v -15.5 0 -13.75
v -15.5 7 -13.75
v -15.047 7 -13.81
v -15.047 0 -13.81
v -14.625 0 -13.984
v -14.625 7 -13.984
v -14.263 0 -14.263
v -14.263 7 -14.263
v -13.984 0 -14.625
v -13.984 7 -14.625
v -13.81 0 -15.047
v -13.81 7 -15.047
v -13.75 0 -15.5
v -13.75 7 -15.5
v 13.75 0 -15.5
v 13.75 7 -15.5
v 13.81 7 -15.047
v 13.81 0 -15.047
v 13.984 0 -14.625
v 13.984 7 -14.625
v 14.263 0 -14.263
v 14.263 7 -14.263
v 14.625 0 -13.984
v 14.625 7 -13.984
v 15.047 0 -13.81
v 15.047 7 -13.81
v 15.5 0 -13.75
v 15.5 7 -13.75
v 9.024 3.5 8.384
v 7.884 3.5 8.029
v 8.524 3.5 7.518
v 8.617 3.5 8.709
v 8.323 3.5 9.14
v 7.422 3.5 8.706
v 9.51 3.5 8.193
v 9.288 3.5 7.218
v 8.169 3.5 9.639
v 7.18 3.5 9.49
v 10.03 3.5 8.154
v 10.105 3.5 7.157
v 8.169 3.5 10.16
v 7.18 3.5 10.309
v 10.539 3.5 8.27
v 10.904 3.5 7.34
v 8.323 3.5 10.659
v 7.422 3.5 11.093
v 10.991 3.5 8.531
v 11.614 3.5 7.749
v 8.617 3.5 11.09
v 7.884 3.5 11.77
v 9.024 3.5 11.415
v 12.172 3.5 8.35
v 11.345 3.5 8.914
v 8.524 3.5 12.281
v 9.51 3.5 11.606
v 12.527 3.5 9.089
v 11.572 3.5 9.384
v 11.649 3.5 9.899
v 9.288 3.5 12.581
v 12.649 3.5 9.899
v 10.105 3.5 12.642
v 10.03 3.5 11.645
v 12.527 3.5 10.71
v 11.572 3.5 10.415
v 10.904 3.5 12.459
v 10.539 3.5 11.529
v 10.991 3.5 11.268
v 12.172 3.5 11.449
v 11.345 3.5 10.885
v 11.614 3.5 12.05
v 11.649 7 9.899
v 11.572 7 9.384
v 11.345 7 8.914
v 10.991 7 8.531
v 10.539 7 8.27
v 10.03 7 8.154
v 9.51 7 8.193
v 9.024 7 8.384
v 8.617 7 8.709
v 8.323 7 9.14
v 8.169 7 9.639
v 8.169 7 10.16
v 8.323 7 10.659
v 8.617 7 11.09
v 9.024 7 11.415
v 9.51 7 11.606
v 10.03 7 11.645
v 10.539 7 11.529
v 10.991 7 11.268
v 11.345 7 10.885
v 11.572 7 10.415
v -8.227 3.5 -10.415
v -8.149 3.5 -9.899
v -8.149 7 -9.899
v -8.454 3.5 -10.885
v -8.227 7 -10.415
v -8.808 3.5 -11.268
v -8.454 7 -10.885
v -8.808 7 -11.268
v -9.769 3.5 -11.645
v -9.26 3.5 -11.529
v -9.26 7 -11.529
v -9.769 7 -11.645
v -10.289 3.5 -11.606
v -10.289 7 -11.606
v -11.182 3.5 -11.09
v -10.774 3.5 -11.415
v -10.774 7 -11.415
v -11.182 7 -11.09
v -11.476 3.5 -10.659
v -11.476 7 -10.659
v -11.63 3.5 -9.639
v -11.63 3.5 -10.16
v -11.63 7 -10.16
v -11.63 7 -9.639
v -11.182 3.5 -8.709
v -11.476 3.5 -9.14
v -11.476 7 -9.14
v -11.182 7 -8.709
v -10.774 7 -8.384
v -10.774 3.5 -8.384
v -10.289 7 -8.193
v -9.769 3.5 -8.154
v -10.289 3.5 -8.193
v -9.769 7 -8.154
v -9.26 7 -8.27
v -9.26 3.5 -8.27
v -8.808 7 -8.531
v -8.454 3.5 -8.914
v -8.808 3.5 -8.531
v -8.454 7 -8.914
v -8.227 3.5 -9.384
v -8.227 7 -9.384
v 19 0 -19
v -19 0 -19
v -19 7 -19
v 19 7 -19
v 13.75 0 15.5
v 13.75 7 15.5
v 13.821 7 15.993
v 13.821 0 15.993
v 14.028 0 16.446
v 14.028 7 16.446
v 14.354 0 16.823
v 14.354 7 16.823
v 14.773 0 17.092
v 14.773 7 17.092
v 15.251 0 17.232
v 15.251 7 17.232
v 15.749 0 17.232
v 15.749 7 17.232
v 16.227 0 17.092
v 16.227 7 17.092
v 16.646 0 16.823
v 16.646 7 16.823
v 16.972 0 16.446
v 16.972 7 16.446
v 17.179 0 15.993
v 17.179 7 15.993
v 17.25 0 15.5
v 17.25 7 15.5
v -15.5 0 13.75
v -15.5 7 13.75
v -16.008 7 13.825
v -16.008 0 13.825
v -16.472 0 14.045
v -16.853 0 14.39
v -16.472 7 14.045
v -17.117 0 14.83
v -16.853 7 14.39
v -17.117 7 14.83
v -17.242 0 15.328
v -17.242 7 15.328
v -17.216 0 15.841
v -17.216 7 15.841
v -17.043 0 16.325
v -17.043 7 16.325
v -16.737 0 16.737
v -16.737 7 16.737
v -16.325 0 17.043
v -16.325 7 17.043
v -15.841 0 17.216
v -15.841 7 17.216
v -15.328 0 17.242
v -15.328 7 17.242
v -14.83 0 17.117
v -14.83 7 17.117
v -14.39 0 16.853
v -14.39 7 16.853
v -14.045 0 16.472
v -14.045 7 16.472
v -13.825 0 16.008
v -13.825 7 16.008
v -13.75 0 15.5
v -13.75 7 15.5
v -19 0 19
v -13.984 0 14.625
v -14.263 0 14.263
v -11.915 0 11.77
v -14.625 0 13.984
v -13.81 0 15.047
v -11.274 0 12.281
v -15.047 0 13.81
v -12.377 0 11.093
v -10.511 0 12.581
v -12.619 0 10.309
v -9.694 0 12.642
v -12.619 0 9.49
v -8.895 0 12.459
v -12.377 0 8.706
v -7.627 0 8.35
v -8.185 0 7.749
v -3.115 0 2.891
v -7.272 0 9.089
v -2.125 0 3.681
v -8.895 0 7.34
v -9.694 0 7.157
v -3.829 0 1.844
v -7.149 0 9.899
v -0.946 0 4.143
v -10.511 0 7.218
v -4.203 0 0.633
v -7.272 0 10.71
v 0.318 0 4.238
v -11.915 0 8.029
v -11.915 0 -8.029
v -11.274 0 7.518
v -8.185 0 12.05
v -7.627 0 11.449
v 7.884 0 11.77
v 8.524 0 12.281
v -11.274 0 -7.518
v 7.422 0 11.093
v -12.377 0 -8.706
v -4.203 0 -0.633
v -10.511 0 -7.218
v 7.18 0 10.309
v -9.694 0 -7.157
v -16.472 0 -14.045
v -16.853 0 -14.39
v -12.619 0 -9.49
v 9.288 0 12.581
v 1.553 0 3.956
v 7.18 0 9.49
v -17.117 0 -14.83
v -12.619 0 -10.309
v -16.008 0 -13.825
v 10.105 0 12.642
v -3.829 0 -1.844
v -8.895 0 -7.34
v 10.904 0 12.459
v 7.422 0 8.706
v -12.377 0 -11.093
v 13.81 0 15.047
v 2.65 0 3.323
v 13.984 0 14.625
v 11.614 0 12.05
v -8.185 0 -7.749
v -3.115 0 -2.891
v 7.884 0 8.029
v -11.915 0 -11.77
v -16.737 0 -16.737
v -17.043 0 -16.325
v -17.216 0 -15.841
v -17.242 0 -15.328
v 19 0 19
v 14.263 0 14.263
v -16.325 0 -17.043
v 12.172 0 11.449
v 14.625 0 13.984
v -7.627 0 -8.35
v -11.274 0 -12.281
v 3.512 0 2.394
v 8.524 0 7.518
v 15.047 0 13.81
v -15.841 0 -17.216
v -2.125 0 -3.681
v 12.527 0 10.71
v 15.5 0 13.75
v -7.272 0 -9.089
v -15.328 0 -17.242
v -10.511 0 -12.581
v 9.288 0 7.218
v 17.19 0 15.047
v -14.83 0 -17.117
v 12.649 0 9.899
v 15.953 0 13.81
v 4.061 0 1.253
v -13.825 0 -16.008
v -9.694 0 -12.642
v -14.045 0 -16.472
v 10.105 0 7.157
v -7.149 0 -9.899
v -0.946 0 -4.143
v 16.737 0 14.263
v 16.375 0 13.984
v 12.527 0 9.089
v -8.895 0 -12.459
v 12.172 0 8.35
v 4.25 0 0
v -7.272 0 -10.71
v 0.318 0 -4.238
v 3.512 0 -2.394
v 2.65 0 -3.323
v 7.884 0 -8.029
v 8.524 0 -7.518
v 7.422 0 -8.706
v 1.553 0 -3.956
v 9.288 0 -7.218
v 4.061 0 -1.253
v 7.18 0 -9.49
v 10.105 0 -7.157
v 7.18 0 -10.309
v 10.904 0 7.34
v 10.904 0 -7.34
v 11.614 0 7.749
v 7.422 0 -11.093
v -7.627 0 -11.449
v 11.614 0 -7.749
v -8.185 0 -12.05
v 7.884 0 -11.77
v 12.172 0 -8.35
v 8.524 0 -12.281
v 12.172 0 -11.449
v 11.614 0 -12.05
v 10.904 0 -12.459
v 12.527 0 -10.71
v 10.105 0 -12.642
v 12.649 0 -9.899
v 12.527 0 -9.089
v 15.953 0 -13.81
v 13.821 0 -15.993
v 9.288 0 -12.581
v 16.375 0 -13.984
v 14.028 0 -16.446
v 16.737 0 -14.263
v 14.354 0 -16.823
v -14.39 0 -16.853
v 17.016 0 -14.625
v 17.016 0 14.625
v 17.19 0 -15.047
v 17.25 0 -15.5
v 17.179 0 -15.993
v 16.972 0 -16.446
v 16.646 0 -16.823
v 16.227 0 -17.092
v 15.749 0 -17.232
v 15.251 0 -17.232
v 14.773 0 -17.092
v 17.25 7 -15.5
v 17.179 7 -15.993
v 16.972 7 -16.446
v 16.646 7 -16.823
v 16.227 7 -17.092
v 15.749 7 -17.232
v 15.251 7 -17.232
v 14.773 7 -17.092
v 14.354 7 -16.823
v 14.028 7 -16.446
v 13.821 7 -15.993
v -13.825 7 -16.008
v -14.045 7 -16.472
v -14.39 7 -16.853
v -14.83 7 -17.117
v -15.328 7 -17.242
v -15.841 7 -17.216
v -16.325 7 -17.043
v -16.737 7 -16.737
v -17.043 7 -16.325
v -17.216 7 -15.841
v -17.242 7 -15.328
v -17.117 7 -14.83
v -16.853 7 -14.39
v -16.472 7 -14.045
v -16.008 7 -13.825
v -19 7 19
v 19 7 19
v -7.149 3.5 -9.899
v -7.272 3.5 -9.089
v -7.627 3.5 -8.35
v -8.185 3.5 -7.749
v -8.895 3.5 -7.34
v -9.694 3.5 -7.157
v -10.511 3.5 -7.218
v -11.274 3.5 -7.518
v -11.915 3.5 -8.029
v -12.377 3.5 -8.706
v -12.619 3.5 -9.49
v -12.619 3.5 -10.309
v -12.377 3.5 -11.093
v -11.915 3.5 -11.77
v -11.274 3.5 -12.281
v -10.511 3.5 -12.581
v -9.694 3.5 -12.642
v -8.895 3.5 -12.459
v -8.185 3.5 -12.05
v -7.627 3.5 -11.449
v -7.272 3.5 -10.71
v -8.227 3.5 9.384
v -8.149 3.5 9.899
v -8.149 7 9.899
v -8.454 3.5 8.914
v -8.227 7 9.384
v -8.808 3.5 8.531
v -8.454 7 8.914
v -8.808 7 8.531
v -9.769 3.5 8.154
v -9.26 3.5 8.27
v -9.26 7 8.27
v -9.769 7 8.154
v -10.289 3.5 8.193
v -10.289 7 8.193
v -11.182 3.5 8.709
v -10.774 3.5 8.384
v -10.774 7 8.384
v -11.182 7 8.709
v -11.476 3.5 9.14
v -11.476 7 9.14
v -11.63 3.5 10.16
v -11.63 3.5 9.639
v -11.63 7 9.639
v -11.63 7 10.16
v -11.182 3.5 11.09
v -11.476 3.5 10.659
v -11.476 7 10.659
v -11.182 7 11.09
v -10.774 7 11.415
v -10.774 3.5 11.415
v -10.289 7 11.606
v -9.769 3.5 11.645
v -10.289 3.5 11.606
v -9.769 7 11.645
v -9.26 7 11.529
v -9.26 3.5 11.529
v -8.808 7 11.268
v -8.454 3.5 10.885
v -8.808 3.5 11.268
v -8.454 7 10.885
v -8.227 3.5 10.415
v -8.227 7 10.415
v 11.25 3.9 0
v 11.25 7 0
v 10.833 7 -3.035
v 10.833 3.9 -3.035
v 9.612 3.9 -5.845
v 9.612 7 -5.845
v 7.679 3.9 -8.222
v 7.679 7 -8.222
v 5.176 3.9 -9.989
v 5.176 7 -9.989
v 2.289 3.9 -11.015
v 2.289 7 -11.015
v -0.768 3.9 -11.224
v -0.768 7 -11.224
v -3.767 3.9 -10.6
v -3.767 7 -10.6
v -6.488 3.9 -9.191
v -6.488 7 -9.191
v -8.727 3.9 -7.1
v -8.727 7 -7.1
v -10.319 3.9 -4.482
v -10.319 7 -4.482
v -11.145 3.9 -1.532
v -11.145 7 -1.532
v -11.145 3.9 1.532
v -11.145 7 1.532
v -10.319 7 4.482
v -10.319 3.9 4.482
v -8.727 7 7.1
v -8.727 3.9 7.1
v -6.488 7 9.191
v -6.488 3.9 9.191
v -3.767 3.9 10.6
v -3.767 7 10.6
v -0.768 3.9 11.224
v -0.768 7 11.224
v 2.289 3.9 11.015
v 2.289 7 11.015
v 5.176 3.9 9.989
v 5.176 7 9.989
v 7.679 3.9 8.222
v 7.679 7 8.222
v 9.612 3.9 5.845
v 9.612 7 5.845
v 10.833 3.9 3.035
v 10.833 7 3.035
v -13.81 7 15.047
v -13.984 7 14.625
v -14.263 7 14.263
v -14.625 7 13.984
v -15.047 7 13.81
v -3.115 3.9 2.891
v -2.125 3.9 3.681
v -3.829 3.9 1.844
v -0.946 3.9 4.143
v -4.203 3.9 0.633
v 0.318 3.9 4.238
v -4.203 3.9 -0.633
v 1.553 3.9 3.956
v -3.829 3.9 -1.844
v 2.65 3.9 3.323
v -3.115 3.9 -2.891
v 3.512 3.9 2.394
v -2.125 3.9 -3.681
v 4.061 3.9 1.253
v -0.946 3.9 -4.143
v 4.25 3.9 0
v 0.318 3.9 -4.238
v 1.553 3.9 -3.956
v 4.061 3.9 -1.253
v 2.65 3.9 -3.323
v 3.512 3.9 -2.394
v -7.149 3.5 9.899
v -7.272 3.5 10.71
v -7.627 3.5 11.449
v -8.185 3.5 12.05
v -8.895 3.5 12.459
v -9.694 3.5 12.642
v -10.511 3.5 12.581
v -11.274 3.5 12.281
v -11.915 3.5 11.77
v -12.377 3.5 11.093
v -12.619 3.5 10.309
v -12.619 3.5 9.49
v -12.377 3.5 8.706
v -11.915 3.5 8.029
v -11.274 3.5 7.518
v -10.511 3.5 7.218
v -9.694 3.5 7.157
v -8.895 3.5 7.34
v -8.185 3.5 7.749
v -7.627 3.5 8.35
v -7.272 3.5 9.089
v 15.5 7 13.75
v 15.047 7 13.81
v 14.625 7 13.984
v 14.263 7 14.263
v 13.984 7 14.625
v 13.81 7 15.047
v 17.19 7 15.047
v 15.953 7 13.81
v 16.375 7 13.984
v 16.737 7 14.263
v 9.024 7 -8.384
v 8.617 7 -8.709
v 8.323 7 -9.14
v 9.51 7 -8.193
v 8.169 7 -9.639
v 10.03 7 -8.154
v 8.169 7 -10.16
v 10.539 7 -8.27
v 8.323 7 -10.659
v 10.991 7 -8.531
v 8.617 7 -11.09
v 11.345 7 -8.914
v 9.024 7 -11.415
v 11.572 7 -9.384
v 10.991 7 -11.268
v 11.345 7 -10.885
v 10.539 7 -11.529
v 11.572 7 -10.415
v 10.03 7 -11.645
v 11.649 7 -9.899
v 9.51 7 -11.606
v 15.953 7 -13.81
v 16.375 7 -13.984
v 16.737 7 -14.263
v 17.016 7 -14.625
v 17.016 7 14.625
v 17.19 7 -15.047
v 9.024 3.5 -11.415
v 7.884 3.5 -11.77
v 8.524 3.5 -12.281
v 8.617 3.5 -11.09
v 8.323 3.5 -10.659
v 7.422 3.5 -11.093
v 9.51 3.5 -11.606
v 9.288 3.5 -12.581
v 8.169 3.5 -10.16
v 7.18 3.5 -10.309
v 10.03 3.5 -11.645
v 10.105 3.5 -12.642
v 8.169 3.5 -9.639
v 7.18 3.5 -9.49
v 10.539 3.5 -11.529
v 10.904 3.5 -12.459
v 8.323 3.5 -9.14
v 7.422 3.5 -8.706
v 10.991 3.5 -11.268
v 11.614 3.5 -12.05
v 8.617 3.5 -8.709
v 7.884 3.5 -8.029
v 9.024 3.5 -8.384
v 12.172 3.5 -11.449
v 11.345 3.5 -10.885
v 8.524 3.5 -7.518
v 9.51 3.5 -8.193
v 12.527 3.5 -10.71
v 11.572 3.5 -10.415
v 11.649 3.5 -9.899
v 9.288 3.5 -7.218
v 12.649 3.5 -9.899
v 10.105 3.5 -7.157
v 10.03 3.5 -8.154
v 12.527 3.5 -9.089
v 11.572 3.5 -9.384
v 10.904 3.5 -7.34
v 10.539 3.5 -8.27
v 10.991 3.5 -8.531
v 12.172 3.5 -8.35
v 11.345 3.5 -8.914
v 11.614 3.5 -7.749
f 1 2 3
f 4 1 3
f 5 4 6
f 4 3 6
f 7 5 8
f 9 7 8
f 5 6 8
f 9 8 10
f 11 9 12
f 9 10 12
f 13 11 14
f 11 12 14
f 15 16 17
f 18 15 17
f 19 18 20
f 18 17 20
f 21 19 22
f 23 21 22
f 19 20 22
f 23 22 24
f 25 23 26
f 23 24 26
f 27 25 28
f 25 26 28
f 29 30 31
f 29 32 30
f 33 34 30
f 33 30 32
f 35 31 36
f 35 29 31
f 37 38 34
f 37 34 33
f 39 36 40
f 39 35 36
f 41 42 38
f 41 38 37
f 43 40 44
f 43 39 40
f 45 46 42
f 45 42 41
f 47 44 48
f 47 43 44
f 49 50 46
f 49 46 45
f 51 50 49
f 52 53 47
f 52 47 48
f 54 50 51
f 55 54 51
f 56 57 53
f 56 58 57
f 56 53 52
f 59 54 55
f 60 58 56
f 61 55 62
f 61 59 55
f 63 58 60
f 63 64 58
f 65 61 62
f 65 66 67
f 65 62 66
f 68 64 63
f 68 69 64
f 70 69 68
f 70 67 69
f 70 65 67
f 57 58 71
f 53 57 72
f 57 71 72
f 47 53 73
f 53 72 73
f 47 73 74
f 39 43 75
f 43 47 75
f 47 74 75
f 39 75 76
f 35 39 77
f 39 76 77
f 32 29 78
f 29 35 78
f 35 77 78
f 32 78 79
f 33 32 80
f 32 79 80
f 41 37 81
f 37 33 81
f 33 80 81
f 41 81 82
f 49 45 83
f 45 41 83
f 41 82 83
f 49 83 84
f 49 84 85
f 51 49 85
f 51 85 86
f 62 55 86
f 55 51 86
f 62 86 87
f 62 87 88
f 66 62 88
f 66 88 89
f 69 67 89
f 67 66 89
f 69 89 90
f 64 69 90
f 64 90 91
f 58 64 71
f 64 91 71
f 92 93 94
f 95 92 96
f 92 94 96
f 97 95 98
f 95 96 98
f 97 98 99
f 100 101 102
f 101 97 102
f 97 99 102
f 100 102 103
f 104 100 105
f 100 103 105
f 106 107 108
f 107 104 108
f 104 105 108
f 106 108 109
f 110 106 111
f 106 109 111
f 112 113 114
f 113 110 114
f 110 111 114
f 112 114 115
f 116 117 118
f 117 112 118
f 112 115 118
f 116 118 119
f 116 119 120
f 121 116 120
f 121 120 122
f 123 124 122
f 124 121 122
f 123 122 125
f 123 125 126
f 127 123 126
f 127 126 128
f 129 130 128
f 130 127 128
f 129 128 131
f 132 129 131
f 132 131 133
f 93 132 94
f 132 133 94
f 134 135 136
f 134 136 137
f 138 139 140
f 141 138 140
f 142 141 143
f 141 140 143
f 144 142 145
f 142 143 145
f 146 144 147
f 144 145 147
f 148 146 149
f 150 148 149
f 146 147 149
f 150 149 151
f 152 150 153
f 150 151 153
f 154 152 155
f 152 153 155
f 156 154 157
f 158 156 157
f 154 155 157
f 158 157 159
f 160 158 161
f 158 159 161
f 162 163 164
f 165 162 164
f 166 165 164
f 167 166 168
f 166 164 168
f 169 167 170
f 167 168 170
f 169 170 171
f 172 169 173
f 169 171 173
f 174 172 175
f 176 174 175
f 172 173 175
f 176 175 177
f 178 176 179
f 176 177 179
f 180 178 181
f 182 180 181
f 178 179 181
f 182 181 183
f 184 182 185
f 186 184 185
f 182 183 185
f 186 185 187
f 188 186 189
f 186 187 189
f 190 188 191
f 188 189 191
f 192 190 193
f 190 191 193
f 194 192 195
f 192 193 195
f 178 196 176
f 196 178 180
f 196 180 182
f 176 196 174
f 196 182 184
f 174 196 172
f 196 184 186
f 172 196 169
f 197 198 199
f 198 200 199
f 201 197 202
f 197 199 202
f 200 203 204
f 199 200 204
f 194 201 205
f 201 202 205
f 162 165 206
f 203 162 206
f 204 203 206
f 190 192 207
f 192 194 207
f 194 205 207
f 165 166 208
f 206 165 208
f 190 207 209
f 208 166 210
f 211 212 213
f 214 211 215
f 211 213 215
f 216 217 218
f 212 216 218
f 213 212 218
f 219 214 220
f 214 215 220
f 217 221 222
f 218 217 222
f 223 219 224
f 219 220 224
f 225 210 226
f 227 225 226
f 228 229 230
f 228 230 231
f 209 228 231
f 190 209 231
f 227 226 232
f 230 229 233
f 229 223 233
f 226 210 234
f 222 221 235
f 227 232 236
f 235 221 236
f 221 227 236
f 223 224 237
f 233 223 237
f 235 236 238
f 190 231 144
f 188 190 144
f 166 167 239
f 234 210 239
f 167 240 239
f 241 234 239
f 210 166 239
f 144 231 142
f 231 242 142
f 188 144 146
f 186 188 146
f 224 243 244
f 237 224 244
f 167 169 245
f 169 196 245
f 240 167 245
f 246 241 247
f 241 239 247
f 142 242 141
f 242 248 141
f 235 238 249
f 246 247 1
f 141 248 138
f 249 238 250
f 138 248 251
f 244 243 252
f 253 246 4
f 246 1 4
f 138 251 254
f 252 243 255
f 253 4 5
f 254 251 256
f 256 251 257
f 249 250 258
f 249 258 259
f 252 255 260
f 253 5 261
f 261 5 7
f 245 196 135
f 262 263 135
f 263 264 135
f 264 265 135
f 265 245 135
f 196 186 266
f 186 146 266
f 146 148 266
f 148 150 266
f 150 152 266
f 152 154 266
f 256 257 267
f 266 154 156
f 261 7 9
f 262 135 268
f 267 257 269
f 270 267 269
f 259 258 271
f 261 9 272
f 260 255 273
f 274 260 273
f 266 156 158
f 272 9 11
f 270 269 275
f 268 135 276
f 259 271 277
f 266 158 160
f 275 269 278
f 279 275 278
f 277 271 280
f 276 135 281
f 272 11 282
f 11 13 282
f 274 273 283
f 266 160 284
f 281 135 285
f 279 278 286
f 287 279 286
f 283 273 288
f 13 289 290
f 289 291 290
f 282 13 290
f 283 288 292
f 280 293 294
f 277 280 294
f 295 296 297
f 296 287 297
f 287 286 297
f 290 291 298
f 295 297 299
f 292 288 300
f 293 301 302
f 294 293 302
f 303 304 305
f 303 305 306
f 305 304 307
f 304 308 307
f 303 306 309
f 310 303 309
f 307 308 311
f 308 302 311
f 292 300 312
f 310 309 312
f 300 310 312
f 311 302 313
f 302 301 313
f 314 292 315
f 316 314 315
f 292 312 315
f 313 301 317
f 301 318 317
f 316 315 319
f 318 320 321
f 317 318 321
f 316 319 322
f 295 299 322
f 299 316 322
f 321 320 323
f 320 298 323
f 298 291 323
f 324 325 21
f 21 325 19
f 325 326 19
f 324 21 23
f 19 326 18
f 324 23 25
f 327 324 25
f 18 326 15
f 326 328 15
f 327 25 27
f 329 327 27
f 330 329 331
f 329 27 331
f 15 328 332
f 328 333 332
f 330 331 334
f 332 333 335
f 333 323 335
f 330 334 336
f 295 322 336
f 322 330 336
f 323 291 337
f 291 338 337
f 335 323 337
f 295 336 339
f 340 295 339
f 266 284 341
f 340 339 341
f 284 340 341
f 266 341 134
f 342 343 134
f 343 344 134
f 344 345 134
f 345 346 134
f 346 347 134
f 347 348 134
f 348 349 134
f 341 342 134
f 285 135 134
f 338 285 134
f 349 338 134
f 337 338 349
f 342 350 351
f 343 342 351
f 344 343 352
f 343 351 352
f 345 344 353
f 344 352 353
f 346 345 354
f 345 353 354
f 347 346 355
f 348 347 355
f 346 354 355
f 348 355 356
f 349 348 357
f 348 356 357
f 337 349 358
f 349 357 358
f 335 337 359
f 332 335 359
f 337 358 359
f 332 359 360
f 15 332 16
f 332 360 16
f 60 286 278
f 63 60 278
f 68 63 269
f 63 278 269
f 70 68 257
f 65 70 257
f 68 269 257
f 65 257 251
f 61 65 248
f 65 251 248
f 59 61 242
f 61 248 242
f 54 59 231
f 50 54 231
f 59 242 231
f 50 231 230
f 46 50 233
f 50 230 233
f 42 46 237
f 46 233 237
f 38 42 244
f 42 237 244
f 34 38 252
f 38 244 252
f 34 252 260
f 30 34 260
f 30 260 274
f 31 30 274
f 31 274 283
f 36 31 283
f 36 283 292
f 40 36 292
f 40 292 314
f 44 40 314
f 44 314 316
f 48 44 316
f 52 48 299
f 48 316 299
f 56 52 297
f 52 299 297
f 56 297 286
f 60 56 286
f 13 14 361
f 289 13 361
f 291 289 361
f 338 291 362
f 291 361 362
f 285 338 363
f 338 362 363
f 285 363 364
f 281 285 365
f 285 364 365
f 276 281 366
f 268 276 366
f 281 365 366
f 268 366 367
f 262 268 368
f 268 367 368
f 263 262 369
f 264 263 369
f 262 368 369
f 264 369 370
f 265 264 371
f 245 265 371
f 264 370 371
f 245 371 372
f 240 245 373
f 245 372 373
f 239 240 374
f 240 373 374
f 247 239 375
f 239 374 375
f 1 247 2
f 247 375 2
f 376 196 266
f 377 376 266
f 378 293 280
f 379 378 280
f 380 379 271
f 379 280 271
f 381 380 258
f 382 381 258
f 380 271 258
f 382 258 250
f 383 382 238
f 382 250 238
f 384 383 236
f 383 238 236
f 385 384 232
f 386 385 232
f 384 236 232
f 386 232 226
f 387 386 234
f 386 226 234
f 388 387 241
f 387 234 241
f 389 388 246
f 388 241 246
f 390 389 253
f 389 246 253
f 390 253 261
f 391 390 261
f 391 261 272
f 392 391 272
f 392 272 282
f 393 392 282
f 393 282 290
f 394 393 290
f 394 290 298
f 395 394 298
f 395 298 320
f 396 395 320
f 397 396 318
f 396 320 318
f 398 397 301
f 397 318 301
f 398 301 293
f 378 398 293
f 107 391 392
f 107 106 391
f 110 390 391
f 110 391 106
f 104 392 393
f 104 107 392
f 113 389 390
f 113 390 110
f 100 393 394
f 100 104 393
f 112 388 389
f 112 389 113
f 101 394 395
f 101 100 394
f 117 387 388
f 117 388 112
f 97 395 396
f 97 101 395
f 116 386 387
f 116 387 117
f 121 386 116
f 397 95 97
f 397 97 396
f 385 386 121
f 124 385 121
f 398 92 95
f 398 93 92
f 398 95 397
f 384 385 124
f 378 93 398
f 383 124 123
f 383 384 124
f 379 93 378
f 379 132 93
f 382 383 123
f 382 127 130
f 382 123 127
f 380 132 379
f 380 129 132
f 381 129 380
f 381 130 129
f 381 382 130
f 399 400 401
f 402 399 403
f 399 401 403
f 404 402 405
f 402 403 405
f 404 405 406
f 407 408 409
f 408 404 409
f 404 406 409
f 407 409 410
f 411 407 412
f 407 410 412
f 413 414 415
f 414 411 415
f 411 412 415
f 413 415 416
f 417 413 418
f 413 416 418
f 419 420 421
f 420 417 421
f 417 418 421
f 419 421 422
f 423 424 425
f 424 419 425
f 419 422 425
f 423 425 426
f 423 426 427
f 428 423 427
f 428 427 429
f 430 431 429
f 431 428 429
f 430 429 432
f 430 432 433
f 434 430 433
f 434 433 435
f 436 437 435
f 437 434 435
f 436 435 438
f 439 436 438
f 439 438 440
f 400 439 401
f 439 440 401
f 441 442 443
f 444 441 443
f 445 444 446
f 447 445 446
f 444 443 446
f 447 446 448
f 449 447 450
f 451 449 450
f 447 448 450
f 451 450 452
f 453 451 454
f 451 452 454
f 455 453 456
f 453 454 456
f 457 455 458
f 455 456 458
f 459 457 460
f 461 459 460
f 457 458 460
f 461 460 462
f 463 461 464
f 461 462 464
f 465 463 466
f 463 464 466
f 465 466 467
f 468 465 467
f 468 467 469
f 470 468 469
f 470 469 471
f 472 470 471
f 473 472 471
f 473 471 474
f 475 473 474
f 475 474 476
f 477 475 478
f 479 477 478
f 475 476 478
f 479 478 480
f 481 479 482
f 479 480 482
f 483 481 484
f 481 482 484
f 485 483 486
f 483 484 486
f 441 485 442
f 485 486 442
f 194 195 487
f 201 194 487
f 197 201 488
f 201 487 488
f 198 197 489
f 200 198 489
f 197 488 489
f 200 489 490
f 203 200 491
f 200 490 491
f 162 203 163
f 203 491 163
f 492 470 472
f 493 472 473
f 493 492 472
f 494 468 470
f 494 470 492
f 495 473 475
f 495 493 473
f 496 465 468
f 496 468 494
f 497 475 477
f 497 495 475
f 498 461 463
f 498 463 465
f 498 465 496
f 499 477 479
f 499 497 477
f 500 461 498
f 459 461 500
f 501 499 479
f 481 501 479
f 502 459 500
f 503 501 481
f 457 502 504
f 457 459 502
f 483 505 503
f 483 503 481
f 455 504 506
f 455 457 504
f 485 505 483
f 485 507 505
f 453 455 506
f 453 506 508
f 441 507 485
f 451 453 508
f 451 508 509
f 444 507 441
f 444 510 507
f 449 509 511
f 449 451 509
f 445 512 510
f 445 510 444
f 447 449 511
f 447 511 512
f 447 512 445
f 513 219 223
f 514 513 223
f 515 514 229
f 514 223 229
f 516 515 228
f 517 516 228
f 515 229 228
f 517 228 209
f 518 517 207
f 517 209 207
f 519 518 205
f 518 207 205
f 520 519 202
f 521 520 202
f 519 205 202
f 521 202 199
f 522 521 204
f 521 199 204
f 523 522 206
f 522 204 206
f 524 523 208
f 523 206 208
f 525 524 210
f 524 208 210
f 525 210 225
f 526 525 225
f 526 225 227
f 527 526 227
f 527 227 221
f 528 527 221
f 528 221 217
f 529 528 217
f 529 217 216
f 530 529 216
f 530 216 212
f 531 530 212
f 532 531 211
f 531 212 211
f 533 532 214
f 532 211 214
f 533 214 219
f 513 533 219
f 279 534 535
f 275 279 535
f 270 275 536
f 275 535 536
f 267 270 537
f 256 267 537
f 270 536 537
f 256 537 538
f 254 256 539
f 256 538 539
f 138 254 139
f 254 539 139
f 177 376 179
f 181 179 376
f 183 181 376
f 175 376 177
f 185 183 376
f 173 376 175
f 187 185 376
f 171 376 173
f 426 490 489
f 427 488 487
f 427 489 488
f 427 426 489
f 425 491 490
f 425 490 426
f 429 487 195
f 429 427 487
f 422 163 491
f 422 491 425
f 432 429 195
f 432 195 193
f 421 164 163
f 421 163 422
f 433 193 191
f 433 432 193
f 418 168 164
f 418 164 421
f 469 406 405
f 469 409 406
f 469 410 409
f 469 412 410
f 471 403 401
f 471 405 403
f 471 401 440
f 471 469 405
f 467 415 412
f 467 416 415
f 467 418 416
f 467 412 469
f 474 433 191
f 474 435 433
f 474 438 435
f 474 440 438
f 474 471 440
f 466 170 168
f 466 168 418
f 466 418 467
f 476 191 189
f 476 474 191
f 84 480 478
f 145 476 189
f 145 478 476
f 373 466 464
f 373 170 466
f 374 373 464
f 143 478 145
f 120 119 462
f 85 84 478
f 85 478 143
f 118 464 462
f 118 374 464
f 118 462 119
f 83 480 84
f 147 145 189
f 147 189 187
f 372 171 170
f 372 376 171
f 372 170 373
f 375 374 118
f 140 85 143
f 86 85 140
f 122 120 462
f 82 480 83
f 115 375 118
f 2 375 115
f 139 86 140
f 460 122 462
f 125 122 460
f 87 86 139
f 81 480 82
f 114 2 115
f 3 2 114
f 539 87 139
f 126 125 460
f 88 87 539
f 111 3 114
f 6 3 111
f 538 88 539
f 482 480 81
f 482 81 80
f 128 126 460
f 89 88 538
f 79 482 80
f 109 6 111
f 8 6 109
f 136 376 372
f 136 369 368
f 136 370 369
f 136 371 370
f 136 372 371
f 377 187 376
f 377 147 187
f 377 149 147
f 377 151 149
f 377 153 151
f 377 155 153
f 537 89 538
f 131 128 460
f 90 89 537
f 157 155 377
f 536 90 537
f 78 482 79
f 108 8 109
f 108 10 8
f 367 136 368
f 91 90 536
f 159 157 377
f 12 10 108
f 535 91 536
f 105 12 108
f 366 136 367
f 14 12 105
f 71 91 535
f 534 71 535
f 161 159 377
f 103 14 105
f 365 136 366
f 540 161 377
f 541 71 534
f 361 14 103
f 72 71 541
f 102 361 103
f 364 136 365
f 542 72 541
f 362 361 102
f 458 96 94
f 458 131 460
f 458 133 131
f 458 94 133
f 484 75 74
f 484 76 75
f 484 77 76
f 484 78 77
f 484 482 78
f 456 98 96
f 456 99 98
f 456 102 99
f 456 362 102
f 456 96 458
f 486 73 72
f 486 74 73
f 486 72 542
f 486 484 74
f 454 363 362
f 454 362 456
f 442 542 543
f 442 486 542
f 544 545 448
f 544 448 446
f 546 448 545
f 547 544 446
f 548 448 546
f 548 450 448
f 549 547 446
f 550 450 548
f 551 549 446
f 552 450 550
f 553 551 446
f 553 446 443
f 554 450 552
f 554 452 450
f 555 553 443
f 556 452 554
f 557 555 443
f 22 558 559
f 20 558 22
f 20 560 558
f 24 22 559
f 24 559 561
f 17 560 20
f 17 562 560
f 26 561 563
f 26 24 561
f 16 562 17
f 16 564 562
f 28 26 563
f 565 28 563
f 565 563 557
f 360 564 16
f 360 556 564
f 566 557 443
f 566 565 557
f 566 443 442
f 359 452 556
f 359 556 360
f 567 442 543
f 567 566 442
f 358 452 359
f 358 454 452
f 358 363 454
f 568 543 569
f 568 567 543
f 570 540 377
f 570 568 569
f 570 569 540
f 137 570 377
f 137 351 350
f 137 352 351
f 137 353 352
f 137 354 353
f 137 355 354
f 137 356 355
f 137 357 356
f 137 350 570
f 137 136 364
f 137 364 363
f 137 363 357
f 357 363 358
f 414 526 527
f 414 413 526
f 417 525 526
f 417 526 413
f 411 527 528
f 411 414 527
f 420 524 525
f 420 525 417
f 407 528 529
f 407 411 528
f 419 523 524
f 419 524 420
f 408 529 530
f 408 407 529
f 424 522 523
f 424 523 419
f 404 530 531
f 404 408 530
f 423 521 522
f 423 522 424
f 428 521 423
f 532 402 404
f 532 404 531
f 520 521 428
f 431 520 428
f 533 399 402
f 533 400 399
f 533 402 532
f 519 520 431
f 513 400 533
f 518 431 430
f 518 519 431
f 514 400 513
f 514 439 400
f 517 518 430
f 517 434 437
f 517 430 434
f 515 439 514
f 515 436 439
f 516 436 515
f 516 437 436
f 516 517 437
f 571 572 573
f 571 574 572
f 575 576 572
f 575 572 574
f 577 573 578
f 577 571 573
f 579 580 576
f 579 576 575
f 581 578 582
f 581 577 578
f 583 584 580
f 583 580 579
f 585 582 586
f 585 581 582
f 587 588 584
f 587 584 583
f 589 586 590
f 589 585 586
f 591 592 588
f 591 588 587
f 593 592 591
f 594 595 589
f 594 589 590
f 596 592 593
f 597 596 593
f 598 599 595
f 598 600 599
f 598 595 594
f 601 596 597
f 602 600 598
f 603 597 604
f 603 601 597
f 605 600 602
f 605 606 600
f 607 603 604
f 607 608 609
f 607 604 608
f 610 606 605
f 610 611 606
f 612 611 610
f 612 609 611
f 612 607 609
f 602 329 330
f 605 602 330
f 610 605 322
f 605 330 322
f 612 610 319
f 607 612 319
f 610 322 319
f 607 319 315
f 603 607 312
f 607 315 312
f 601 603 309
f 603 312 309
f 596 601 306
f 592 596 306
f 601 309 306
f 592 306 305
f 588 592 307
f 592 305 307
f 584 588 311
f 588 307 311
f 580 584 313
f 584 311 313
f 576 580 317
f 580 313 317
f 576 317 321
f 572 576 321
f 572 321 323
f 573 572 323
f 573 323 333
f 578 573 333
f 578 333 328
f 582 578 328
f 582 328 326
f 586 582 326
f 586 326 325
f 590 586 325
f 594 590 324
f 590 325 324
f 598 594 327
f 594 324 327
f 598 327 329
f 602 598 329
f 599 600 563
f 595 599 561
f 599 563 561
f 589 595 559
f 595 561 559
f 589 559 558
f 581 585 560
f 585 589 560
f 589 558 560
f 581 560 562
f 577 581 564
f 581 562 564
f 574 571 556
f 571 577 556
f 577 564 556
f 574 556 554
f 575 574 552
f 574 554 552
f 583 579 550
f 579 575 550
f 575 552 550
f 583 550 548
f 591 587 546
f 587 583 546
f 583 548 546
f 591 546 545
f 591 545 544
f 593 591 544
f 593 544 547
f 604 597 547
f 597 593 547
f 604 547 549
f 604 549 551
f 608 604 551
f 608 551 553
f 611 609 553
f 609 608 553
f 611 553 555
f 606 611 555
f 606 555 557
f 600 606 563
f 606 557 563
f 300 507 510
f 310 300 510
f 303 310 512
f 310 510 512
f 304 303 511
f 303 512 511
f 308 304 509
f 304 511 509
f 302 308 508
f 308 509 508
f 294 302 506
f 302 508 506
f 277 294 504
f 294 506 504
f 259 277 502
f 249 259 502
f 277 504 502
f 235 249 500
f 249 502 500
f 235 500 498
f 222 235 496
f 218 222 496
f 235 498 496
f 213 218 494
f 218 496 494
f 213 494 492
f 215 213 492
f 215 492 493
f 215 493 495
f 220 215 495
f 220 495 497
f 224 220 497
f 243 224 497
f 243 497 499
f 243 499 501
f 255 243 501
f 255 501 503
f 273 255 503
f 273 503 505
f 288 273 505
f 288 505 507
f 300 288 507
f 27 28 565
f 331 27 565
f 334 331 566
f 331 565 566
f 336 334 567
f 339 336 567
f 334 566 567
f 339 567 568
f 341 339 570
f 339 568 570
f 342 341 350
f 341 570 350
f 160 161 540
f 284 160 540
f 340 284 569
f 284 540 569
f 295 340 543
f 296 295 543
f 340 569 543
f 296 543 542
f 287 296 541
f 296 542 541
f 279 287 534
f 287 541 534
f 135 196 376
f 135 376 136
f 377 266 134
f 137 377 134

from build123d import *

# Parameters (mm, degrees)
SKETCH1_W           = 38
SKETCH1_H           = 38
BOSS_EXTRUDE1_DEPTH = 7
SKETCH2_R           = 4.25
CUT_EXTRUDE1_DEPTH  = 7
SKETCH3_R           = 11.25
CUT_EXTRUDE2_DEPTH  = 3.1
SKETCH5_R           = 1.75
CUT_EXTRUDE3_DEPTH  = 27
SKETCH6_R           = 2.75
SKETCH6_R_2         = 1.75
CUT_EXTRUDE14_DEPTH = 3.5


with BuildPart() as part:
    # Sketch1 → Boss-Extrude1 (new body)
    with BuildSketch(Plane(origin=(0, 0, 0), x_dir=(1, 0, 0), z_dir=(0, 1, 0))):
        Rectangle(SKETCH1_W, SKETCH1_H)
    extrude(amount=BOSS_EXTRUDE1_DEPTH)

    # Sketch2 → Cut-Extrude1 (cut)
    with BuildSketch(Plane(origin=(0, 7, 0), x_dir=(1, 0, 0), z_dir=(0, 1, 0))):
        with BuildLine():
            ThreePointArc((-13.75, 15.5), (-16.737436867, 16.737436867), (-15.5, 13.75))
            Line((-15.5, 13.75), (-15.5, 15.5))
            Line((-15.5, 15.5), (-13.75, 15.5))
        make_face()
        with BuildLine():
            Line((-15.5, 15.5), (-15.5, 13.75))
            ThreePointArc((-15.5, 13.75), (-14.262563133, 14.262563133), (-13.75, 15.5))
            Line((-13.75, 15.5), (-15.5, 15.5))
        make_face()
        with BuildLine():
            ThreePointArc((13.75, 15.5), (14.262563133, 14.262563133), (15.5, 13.75))
            Line((15.5, 13.75), (15.5, 15.5))
            Line((15.5, 15.5), (13.75, 15.5))
        make_face()
        with BuildLine():
            Line((15.5, 15.5), (15.5, 13.75))
            ThreePointArc((15.5, 13.75), (16.737436867, 14.262563133), (17.25, 15.5))
            ThreePointArc((17.25, 15.5), (15.5, 17.25), (13.75, 15.5))
            Line((13.75, 15.5), (15.5, 15.5))
        make_face()
        with BuildLine():
            ThreePointArc((15.5, -13.75), (14.262563133, -14.262563133), (13.75, -15.5))
            Line((13.75, -15.5), (15.5, -15.5))
            Line((15.5, -15.5), (15.5, -13.75))
        make_face()
        with BuildLine():
            Line((15.5, -15.5), (13.75, -15.5))
            ThreePointArc((13.75, -15.5), (15.5, -17.25), (17.25, -15.5))
            ThreePointArc((17.25, -15.5), (16.737436867, -14.262563133), (15.5, -13.75))
            Line((15.5, -13.75), (15.5, -15.5))
        make_face()
        with BuildLine():
            ThreePointArc((-15.5, -13.75), (-16.737436867, -16.737436867), (-13.75, -15.5))
            Line((-13.75, -15.5), (-15.5, -15.5))
            Line((-15.5, -15.5), (-15.5, -13.75))
        make_face()
        with BuildLine():
            Line((-15.5, -15.5), (-13.75, -15.5))
            ThreePointArc((-13.75, -15.5), (-14.262563133, -14.262563133), (-15.5, -13.75))
            Line((-15.5, -13.75), (-15.5, -15.5))
        make_face()
        Circle(SKETCH2_R)
    extrude(amount=-CUT_EXTRUDE1_DEPTH, mode=Mode.SUBTRACT)

    # Sketch3 → Cut-Extrude2 (cut)
    with BuildSketch(Plane(origin=(0, 7, 0), x_dir=(1, 0, 0), z_dir=(0, 1, 0))):
        Circle(SKETCH3_R)
    extrude(amount=-CUT_EXTRUDE2_DEPTH, mode=Mode.SUBTRACT)

    # Sketch5 → Cut-Extrude3 (cut)
    with BuildSketch(Plane(origin=(0, 7, 0), x_dir=(1, 0, 0), z_dir=(0, 1, 0))):
        with Locations((-9.899494937, 9.899494937)):
            Circle(SKETCH5_R)
        with Locations((9.899494937, 9.899494937)):
            Circle(SKETCH5_R)
        with Locations((9.899494937, -9.899494937)):
            Circle(SKETCH5_R)
        with Locations((-9.899494937, -9.899494937)):
            Circle(SKETCH5_R)
    extrude(amount=-CUT_EXTRUDE3_DEPTH, mode=Mode.SUBTRACT)

    # Sketch6 → Cut-Extrude14 (cut)
    with BuildSketch(Plane.XZ):
        with Locations((-9.899494937, 9.899494937)):
            Circle(SKETCH6_R)
        with Locations((-9.899494937, 9.899494937)):
            Circle(SKETCH6_R_2, mode=Mode.SUBTRACT)
        with Locations((9.899494937, 9.899494937)):
            Circle(SKETCH6_R)
        with Locations((9.899494937, 9.899494937)):
            Circle(SKETCH6_R_2, mode=Mode.SUBTRACT)
        with Locations((9.899494937, -9.899494937)):
            Circle(SKETCH6_R)
        with Locations((9.899494937, -9.899494937)):
            Circle(SKETCH6_R_2, mode=Mode.SUBTRACT)
        with Locations((-9.899494937, -9.899494937)):
            Circle(SKETCH6_R)
        with Locations((-9.899494937, -9.899494937)):
            Circle(SKETCH6_R_2, mode=Mode.SUBTRACT)
    extrude(amount=-CUT_EXTRUDE14_DEPTH, mode=Mode.SUBTRACT)


solid = part.part
